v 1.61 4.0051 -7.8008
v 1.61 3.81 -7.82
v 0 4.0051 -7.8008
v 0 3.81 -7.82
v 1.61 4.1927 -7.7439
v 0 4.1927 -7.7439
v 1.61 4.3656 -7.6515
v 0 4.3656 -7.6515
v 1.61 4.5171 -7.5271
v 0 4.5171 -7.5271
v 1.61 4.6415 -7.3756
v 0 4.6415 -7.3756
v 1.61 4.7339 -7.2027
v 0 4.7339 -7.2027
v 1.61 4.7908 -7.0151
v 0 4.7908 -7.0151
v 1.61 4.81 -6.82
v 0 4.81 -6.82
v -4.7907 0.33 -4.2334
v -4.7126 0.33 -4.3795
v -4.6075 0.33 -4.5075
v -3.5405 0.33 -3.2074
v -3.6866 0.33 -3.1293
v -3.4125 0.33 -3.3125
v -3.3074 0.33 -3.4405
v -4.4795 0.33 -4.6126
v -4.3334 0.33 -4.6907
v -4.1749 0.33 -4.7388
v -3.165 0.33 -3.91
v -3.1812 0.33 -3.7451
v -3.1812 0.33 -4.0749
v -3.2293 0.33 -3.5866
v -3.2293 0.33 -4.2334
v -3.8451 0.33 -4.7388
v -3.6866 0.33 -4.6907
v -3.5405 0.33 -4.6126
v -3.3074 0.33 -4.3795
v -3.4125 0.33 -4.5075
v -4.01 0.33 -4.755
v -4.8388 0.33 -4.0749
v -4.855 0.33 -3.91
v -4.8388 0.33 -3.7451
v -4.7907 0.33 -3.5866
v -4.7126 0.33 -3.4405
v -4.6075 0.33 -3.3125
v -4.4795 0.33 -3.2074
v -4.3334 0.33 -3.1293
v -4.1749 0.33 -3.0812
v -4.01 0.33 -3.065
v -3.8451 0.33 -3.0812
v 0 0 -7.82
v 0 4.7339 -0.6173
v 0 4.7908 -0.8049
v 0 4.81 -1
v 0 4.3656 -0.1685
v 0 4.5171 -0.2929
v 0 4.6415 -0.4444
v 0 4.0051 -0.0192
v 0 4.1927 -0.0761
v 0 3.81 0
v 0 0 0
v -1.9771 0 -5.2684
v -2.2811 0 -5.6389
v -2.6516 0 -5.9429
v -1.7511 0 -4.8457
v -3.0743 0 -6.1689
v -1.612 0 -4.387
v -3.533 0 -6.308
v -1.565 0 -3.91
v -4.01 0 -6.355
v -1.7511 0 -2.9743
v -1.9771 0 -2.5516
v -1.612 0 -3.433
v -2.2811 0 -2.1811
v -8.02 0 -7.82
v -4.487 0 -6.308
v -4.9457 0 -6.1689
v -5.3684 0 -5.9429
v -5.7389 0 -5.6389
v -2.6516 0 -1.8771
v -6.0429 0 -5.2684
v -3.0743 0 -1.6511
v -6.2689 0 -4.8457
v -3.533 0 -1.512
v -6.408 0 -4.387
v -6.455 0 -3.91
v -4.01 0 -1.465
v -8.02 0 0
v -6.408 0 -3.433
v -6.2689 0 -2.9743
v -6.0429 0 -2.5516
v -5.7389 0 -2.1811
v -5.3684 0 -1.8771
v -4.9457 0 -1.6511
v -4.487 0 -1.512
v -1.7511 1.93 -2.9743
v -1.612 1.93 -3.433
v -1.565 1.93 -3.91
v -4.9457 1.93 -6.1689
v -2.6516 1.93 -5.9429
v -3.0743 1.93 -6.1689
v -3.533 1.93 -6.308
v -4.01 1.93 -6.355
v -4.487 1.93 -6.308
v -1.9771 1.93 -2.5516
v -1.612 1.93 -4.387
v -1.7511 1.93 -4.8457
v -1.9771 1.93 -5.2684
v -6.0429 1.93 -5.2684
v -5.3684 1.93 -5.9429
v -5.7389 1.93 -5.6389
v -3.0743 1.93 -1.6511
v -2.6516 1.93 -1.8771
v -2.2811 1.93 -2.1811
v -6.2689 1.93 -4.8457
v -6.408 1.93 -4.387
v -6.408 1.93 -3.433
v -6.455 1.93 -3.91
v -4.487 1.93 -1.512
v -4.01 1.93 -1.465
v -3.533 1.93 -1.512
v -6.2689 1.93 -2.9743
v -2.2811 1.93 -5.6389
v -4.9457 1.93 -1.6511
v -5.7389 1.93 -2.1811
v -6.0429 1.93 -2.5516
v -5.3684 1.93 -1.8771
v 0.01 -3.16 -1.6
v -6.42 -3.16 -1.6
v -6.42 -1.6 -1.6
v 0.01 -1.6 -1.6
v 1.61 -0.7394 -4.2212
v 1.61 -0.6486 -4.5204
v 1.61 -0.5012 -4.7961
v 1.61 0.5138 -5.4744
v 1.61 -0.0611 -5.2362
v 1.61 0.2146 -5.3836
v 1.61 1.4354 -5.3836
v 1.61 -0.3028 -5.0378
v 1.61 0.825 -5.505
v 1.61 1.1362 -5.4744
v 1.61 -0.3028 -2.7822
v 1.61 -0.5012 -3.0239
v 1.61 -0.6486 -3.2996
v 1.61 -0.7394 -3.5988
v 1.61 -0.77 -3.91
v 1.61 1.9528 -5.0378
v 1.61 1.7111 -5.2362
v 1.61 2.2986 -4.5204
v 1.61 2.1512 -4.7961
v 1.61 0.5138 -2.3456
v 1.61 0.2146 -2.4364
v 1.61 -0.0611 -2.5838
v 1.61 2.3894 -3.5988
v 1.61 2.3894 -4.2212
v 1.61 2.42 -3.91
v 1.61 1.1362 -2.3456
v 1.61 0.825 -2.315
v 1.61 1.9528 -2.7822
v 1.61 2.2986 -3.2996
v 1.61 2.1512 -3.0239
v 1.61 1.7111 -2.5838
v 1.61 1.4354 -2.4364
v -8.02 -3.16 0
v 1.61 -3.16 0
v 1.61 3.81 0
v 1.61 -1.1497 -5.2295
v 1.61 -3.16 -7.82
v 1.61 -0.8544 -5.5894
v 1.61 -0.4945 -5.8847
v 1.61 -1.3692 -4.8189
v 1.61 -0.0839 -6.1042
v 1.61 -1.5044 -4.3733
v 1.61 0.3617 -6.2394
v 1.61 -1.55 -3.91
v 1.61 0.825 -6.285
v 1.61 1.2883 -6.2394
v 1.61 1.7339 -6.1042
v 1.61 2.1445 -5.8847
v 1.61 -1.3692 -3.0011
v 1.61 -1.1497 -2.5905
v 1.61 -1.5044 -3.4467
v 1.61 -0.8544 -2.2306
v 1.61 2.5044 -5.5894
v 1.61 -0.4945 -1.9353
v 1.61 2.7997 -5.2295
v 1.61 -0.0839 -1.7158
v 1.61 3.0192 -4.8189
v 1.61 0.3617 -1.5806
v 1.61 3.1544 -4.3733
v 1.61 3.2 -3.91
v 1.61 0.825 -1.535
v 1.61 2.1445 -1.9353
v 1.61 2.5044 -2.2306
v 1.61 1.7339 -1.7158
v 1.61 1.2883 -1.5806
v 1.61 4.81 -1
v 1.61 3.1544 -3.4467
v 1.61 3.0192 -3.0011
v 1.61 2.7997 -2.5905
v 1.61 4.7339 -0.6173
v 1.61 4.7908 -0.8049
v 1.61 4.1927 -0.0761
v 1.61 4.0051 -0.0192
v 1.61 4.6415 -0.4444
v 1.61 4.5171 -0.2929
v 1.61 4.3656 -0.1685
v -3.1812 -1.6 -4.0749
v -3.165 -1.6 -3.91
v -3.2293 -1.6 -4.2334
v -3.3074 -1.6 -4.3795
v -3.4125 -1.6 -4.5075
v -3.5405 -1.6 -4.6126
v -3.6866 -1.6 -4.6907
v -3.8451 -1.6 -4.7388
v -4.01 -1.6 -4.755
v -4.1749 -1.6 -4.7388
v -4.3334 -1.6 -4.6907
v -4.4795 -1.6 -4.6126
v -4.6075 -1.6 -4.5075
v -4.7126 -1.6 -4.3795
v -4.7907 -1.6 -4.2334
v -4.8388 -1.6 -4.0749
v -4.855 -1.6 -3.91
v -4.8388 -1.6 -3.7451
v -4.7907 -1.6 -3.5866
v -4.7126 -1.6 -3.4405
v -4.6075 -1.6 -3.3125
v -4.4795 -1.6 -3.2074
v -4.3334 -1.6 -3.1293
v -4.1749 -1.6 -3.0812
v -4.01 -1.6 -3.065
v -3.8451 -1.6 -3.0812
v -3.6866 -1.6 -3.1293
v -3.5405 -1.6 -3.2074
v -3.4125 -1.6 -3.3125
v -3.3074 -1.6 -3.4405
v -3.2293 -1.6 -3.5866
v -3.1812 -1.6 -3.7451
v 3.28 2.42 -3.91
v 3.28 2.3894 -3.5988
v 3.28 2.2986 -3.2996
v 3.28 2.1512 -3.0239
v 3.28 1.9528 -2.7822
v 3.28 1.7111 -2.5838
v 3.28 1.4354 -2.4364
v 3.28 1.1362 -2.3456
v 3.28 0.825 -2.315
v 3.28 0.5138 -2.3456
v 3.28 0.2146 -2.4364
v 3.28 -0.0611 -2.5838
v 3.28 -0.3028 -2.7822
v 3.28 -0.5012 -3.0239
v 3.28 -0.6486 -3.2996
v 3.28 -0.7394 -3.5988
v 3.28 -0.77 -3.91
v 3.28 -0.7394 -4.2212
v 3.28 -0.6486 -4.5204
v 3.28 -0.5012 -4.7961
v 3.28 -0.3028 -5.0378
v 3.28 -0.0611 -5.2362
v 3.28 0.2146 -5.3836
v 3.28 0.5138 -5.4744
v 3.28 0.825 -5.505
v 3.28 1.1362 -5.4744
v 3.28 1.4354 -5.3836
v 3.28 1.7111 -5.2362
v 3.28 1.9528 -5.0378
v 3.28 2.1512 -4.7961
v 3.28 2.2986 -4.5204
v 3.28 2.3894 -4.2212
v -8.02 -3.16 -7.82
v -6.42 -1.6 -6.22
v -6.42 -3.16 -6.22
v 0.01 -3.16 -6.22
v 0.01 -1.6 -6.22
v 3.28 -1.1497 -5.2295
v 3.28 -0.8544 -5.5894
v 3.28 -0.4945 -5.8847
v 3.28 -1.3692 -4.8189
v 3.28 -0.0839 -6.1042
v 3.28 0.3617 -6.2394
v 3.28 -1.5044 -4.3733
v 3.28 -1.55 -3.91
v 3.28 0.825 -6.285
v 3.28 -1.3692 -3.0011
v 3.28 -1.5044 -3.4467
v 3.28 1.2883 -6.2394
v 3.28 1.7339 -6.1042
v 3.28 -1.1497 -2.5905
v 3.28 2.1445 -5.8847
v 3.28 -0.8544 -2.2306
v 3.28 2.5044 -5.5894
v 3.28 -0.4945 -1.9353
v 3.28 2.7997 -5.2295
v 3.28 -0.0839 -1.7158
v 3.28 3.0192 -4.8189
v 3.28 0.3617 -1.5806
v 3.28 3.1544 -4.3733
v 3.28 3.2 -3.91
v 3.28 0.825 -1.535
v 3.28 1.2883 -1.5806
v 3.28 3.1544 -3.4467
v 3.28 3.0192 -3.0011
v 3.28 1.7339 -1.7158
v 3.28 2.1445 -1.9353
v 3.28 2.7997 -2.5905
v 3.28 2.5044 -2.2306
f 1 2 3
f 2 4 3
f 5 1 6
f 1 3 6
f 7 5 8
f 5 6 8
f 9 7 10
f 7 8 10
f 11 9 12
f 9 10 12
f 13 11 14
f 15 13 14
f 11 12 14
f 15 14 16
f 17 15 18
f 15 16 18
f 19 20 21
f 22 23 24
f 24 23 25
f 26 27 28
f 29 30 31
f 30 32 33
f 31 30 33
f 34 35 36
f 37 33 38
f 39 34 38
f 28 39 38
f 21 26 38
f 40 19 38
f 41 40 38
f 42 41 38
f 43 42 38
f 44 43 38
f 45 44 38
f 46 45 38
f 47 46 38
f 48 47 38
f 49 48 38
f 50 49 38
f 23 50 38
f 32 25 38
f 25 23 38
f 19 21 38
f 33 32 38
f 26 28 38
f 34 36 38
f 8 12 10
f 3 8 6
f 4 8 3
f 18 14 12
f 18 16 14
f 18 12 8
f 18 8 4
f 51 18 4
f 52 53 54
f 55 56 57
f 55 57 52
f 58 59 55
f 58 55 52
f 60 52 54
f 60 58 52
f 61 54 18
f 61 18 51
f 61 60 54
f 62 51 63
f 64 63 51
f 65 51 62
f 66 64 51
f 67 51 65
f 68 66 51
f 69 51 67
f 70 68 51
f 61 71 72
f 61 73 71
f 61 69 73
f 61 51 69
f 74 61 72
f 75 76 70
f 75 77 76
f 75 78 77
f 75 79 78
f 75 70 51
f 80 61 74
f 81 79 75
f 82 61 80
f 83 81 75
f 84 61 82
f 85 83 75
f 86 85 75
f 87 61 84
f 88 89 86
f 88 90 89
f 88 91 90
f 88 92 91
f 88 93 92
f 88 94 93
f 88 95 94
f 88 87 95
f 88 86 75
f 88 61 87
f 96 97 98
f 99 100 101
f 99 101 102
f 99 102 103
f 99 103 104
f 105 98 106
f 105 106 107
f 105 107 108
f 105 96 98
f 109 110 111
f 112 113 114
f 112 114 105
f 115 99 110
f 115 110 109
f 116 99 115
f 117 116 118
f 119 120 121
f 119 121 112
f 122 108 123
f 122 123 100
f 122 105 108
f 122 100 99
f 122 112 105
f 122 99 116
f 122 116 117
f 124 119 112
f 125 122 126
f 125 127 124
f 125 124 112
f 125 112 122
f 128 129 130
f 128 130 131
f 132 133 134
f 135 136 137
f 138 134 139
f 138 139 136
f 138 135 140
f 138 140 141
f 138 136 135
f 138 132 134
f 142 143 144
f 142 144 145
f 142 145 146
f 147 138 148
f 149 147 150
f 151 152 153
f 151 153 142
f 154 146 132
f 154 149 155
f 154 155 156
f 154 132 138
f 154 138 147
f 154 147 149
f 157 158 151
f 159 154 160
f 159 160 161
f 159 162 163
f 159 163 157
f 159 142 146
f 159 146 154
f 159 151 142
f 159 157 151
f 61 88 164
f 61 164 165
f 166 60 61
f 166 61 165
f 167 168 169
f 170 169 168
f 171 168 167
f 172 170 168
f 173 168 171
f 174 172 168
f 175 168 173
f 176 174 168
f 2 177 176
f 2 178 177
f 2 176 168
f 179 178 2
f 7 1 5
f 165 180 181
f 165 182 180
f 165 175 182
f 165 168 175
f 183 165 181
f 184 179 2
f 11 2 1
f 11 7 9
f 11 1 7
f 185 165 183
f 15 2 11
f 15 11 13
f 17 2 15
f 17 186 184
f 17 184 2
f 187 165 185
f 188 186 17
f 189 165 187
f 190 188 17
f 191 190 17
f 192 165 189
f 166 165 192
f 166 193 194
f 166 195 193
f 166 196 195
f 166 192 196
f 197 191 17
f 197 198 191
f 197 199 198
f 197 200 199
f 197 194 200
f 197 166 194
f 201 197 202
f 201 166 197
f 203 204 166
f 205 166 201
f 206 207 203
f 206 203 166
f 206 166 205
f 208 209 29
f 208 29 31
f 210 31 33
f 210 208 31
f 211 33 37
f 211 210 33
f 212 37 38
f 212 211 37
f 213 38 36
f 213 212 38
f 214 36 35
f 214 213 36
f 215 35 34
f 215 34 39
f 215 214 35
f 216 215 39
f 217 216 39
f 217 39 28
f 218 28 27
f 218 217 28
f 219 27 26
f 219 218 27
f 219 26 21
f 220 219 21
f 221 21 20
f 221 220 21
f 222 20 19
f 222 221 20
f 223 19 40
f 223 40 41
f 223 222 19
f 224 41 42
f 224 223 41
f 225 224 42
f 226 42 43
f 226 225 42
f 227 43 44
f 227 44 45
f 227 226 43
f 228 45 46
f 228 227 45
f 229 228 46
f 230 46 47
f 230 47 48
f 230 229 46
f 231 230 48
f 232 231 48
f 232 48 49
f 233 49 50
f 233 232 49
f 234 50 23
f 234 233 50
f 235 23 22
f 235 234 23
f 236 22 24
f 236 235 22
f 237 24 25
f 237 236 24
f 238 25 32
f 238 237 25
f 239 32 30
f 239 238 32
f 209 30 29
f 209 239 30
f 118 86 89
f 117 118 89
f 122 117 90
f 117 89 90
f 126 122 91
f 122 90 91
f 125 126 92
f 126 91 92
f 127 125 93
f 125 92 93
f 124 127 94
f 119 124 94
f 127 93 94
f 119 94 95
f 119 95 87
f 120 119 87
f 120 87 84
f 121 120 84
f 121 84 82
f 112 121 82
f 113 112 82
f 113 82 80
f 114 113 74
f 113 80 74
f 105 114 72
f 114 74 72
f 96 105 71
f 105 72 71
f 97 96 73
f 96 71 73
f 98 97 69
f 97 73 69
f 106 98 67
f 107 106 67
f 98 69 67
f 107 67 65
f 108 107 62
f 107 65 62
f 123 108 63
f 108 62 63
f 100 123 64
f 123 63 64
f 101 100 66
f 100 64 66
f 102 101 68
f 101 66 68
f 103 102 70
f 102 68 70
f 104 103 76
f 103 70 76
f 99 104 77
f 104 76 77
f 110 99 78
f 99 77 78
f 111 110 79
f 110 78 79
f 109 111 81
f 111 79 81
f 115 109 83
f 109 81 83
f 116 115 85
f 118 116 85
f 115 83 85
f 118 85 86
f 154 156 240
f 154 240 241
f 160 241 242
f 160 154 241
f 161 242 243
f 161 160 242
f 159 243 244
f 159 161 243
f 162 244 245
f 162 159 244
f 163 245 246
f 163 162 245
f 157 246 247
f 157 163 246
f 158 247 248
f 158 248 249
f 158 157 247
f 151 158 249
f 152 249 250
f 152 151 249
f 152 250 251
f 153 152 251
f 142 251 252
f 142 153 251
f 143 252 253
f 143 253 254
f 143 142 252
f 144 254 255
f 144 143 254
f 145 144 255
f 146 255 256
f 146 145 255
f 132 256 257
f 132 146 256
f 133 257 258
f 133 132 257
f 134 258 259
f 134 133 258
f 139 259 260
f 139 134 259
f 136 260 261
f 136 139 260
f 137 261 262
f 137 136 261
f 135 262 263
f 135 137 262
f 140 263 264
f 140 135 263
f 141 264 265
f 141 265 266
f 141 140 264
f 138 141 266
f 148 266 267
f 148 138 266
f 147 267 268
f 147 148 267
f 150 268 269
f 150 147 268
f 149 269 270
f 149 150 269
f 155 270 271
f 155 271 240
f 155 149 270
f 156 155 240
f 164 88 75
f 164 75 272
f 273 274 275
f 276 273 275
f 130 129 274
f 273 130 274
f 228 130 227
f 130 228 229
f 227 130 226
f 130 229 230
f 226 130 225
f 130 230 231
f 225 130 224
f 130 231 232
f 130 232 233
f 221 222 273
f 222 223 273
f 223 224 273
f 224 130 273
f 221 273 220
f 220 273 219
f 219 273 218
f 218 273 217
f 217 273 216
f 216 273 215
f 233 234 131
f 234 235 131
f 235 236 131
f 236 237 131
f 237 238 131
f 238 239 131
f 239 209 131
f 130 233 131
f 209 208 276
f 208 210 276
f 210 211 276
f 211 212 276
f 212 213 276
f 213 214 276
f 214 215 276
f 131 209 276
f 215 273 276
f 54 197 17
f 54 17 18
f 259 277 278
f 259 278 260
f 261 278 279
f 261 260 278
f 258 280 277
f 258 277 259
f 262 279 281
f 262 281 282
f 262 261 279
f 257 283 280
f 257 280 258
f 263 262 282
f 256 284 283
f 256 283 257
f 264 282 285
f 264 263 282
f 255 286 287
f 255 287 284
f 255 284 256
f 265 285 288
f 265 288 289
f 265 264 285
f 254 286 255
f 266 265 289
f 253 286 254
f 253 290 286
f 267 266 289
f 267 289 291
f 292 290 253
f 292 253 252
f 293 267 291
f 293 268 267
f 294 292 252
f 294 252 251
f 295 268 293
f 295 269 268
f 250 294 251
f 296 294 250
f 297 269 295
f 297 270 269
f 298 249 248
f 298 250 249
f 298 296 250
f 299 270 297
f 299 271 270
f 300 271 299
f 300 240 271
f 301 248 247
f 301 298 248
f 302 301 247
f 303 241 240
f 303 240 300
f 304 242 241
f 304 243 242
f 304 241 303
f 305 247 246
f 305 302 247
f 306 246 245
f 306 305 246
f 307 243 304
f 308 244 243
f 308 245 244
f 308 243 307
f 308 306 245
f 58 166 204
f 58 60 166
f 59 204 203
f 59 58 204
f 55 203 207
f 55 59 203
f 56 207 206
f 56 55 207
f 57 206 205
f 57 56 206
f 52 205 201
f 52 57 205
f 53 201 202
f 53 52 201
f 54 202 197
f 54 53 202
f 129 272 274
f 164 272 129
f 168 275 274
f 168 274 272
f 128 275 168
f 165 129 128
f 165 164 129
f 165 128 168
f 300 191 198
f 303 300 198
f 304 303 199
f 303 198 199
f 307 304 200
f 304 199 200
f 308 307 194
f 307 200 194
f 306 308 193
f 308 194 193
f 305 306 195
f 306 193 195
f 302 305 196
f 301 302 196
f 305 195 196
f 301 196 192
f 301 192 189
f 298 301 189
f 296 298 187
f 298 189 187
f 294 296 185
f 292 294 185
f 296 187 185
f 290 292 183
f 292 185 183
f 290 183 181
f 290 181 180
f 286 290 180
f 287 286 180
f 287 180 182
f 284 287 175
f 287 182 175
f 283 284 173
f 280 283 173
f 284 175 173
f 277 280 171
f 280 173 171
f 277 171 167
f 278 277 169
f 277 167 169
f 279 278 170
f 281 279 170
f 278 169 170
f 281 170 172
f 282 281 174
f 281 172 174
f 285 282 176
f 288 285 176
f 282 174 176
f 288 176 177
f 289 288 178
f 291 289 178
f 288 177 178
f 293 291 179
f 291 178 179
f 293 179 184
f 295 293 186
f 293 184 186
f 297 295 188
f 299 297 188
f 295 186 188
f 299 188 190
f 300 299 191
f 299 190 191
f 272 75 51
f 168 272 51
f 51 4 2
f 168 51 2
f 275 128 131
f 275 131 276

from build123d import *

# Parameters (mm, degrees)
BOSS_EXTRUDE1_DEPTH = 7.82
SKETCH2_R           = 2.445
BOSS_EXTRUDE2_DEPTH = 1.93
SKETCH3_R           = 2.375
SKETCH3_R_2         = 1.595
BOSS_EXTRUDE3_DEPTH = 1.67
SHELL1_START        = -3.16
SHELL1_OUTLINE_W    = 6.43
SHELL1_OUTLINE_H    = 4.62
SHELL1_DEPTH        = 1.56
SHELL1_START_2      = -1.6
SHELL1_2_OUTLINE_R  = 0.845
SHELL1_2_DEPTH      = 1.93
FILLET1_R           = 1


# Read off the part's stored shape, not the designer's step: Shell1
with BuildPart() as part:
    # Sketch1 → Boss-Extrude1 (new body)
    with BuildSketch(Plane.XY):
        Polygon((0, 0), (-8.02, 0), (-8.02, -3.16), (1.61, -3.16), (1.61, 4.81), (0, 4.81), align=None)
    extrude(amount=-BOSS_EXTRUDE1_DEPTH)

    # Sketch2 → Boss-Extrude2 (add)
    with BuildSketch(Plane(origin=(0, 0, 0), x_dir=(1, 0, 0), z_dir=(0, 1, 0))):
        with Locations(Location((-4.01, 3.91, 0), (0, 0, 180))):
            Circle(SKETCH2_R)
    extrude(amount=BOSS_EXTRUDE2_DEPTH)

    # Sketch3 → Boss-Extrude3 (add)
    with BuildSketch(Plane(origin=(1.61, 0, 0), x_dir=(0, 0, -1), z_dir=(1, 0, 0))):
        with Locations(Location((3.91, 0.825, 0), (0, 0, 90))):
            Circle(SKETCH3_R)
        with Locations(Location((3.91, 0.825, 0), (0, 0, 90))):
            Circle(SKETCH3_R_2, mode=Mode.SUBTRACT)
    extrude(amount=BOSS_EXTRUDE3_DEPTH)

    # Shell1 outline → Shell1 (cut)
    with BuildSketch(Plane(origin=(0, 0, 0), x_dir=(1, 0, 0), z_dir=(0, 1, 0)).offset(SHELL1_START)):
        with Locations((-3.205, 3.91)):
            Rectangle(SHELL1_OUTLINE_W, SHELL1_OUTLINE_H)
    extrude(amount=SHELL1_DEPTH, mode=Mode.SUBTRACT)

    # Shell1 2 outline → Shell1 2 (cut)
    with BuildSketch(Plane(origin=(0, 0, 0), x_dir=(1, 0, 0), z_dir=(0, 1, 0)).offset(SHELL1_START_2)):
        with Locations((-4.01, 3.91)):
            Circle(SHELL1_2_OUTLINE_R)
    extrude(amount=SHELL1_2_DEPTH, mode=Mode.SUBTRACT)

    # Fillet1
    fillet1_edges = [part.edges().sort_by_distance(p)[0] for p in [
        (0.805, 4.81, -7.82),
        (0.805, 4.81, 0),
    ]]
    fillet(fillet1_edges, radius=FILLET1_R)


solid = part.part
